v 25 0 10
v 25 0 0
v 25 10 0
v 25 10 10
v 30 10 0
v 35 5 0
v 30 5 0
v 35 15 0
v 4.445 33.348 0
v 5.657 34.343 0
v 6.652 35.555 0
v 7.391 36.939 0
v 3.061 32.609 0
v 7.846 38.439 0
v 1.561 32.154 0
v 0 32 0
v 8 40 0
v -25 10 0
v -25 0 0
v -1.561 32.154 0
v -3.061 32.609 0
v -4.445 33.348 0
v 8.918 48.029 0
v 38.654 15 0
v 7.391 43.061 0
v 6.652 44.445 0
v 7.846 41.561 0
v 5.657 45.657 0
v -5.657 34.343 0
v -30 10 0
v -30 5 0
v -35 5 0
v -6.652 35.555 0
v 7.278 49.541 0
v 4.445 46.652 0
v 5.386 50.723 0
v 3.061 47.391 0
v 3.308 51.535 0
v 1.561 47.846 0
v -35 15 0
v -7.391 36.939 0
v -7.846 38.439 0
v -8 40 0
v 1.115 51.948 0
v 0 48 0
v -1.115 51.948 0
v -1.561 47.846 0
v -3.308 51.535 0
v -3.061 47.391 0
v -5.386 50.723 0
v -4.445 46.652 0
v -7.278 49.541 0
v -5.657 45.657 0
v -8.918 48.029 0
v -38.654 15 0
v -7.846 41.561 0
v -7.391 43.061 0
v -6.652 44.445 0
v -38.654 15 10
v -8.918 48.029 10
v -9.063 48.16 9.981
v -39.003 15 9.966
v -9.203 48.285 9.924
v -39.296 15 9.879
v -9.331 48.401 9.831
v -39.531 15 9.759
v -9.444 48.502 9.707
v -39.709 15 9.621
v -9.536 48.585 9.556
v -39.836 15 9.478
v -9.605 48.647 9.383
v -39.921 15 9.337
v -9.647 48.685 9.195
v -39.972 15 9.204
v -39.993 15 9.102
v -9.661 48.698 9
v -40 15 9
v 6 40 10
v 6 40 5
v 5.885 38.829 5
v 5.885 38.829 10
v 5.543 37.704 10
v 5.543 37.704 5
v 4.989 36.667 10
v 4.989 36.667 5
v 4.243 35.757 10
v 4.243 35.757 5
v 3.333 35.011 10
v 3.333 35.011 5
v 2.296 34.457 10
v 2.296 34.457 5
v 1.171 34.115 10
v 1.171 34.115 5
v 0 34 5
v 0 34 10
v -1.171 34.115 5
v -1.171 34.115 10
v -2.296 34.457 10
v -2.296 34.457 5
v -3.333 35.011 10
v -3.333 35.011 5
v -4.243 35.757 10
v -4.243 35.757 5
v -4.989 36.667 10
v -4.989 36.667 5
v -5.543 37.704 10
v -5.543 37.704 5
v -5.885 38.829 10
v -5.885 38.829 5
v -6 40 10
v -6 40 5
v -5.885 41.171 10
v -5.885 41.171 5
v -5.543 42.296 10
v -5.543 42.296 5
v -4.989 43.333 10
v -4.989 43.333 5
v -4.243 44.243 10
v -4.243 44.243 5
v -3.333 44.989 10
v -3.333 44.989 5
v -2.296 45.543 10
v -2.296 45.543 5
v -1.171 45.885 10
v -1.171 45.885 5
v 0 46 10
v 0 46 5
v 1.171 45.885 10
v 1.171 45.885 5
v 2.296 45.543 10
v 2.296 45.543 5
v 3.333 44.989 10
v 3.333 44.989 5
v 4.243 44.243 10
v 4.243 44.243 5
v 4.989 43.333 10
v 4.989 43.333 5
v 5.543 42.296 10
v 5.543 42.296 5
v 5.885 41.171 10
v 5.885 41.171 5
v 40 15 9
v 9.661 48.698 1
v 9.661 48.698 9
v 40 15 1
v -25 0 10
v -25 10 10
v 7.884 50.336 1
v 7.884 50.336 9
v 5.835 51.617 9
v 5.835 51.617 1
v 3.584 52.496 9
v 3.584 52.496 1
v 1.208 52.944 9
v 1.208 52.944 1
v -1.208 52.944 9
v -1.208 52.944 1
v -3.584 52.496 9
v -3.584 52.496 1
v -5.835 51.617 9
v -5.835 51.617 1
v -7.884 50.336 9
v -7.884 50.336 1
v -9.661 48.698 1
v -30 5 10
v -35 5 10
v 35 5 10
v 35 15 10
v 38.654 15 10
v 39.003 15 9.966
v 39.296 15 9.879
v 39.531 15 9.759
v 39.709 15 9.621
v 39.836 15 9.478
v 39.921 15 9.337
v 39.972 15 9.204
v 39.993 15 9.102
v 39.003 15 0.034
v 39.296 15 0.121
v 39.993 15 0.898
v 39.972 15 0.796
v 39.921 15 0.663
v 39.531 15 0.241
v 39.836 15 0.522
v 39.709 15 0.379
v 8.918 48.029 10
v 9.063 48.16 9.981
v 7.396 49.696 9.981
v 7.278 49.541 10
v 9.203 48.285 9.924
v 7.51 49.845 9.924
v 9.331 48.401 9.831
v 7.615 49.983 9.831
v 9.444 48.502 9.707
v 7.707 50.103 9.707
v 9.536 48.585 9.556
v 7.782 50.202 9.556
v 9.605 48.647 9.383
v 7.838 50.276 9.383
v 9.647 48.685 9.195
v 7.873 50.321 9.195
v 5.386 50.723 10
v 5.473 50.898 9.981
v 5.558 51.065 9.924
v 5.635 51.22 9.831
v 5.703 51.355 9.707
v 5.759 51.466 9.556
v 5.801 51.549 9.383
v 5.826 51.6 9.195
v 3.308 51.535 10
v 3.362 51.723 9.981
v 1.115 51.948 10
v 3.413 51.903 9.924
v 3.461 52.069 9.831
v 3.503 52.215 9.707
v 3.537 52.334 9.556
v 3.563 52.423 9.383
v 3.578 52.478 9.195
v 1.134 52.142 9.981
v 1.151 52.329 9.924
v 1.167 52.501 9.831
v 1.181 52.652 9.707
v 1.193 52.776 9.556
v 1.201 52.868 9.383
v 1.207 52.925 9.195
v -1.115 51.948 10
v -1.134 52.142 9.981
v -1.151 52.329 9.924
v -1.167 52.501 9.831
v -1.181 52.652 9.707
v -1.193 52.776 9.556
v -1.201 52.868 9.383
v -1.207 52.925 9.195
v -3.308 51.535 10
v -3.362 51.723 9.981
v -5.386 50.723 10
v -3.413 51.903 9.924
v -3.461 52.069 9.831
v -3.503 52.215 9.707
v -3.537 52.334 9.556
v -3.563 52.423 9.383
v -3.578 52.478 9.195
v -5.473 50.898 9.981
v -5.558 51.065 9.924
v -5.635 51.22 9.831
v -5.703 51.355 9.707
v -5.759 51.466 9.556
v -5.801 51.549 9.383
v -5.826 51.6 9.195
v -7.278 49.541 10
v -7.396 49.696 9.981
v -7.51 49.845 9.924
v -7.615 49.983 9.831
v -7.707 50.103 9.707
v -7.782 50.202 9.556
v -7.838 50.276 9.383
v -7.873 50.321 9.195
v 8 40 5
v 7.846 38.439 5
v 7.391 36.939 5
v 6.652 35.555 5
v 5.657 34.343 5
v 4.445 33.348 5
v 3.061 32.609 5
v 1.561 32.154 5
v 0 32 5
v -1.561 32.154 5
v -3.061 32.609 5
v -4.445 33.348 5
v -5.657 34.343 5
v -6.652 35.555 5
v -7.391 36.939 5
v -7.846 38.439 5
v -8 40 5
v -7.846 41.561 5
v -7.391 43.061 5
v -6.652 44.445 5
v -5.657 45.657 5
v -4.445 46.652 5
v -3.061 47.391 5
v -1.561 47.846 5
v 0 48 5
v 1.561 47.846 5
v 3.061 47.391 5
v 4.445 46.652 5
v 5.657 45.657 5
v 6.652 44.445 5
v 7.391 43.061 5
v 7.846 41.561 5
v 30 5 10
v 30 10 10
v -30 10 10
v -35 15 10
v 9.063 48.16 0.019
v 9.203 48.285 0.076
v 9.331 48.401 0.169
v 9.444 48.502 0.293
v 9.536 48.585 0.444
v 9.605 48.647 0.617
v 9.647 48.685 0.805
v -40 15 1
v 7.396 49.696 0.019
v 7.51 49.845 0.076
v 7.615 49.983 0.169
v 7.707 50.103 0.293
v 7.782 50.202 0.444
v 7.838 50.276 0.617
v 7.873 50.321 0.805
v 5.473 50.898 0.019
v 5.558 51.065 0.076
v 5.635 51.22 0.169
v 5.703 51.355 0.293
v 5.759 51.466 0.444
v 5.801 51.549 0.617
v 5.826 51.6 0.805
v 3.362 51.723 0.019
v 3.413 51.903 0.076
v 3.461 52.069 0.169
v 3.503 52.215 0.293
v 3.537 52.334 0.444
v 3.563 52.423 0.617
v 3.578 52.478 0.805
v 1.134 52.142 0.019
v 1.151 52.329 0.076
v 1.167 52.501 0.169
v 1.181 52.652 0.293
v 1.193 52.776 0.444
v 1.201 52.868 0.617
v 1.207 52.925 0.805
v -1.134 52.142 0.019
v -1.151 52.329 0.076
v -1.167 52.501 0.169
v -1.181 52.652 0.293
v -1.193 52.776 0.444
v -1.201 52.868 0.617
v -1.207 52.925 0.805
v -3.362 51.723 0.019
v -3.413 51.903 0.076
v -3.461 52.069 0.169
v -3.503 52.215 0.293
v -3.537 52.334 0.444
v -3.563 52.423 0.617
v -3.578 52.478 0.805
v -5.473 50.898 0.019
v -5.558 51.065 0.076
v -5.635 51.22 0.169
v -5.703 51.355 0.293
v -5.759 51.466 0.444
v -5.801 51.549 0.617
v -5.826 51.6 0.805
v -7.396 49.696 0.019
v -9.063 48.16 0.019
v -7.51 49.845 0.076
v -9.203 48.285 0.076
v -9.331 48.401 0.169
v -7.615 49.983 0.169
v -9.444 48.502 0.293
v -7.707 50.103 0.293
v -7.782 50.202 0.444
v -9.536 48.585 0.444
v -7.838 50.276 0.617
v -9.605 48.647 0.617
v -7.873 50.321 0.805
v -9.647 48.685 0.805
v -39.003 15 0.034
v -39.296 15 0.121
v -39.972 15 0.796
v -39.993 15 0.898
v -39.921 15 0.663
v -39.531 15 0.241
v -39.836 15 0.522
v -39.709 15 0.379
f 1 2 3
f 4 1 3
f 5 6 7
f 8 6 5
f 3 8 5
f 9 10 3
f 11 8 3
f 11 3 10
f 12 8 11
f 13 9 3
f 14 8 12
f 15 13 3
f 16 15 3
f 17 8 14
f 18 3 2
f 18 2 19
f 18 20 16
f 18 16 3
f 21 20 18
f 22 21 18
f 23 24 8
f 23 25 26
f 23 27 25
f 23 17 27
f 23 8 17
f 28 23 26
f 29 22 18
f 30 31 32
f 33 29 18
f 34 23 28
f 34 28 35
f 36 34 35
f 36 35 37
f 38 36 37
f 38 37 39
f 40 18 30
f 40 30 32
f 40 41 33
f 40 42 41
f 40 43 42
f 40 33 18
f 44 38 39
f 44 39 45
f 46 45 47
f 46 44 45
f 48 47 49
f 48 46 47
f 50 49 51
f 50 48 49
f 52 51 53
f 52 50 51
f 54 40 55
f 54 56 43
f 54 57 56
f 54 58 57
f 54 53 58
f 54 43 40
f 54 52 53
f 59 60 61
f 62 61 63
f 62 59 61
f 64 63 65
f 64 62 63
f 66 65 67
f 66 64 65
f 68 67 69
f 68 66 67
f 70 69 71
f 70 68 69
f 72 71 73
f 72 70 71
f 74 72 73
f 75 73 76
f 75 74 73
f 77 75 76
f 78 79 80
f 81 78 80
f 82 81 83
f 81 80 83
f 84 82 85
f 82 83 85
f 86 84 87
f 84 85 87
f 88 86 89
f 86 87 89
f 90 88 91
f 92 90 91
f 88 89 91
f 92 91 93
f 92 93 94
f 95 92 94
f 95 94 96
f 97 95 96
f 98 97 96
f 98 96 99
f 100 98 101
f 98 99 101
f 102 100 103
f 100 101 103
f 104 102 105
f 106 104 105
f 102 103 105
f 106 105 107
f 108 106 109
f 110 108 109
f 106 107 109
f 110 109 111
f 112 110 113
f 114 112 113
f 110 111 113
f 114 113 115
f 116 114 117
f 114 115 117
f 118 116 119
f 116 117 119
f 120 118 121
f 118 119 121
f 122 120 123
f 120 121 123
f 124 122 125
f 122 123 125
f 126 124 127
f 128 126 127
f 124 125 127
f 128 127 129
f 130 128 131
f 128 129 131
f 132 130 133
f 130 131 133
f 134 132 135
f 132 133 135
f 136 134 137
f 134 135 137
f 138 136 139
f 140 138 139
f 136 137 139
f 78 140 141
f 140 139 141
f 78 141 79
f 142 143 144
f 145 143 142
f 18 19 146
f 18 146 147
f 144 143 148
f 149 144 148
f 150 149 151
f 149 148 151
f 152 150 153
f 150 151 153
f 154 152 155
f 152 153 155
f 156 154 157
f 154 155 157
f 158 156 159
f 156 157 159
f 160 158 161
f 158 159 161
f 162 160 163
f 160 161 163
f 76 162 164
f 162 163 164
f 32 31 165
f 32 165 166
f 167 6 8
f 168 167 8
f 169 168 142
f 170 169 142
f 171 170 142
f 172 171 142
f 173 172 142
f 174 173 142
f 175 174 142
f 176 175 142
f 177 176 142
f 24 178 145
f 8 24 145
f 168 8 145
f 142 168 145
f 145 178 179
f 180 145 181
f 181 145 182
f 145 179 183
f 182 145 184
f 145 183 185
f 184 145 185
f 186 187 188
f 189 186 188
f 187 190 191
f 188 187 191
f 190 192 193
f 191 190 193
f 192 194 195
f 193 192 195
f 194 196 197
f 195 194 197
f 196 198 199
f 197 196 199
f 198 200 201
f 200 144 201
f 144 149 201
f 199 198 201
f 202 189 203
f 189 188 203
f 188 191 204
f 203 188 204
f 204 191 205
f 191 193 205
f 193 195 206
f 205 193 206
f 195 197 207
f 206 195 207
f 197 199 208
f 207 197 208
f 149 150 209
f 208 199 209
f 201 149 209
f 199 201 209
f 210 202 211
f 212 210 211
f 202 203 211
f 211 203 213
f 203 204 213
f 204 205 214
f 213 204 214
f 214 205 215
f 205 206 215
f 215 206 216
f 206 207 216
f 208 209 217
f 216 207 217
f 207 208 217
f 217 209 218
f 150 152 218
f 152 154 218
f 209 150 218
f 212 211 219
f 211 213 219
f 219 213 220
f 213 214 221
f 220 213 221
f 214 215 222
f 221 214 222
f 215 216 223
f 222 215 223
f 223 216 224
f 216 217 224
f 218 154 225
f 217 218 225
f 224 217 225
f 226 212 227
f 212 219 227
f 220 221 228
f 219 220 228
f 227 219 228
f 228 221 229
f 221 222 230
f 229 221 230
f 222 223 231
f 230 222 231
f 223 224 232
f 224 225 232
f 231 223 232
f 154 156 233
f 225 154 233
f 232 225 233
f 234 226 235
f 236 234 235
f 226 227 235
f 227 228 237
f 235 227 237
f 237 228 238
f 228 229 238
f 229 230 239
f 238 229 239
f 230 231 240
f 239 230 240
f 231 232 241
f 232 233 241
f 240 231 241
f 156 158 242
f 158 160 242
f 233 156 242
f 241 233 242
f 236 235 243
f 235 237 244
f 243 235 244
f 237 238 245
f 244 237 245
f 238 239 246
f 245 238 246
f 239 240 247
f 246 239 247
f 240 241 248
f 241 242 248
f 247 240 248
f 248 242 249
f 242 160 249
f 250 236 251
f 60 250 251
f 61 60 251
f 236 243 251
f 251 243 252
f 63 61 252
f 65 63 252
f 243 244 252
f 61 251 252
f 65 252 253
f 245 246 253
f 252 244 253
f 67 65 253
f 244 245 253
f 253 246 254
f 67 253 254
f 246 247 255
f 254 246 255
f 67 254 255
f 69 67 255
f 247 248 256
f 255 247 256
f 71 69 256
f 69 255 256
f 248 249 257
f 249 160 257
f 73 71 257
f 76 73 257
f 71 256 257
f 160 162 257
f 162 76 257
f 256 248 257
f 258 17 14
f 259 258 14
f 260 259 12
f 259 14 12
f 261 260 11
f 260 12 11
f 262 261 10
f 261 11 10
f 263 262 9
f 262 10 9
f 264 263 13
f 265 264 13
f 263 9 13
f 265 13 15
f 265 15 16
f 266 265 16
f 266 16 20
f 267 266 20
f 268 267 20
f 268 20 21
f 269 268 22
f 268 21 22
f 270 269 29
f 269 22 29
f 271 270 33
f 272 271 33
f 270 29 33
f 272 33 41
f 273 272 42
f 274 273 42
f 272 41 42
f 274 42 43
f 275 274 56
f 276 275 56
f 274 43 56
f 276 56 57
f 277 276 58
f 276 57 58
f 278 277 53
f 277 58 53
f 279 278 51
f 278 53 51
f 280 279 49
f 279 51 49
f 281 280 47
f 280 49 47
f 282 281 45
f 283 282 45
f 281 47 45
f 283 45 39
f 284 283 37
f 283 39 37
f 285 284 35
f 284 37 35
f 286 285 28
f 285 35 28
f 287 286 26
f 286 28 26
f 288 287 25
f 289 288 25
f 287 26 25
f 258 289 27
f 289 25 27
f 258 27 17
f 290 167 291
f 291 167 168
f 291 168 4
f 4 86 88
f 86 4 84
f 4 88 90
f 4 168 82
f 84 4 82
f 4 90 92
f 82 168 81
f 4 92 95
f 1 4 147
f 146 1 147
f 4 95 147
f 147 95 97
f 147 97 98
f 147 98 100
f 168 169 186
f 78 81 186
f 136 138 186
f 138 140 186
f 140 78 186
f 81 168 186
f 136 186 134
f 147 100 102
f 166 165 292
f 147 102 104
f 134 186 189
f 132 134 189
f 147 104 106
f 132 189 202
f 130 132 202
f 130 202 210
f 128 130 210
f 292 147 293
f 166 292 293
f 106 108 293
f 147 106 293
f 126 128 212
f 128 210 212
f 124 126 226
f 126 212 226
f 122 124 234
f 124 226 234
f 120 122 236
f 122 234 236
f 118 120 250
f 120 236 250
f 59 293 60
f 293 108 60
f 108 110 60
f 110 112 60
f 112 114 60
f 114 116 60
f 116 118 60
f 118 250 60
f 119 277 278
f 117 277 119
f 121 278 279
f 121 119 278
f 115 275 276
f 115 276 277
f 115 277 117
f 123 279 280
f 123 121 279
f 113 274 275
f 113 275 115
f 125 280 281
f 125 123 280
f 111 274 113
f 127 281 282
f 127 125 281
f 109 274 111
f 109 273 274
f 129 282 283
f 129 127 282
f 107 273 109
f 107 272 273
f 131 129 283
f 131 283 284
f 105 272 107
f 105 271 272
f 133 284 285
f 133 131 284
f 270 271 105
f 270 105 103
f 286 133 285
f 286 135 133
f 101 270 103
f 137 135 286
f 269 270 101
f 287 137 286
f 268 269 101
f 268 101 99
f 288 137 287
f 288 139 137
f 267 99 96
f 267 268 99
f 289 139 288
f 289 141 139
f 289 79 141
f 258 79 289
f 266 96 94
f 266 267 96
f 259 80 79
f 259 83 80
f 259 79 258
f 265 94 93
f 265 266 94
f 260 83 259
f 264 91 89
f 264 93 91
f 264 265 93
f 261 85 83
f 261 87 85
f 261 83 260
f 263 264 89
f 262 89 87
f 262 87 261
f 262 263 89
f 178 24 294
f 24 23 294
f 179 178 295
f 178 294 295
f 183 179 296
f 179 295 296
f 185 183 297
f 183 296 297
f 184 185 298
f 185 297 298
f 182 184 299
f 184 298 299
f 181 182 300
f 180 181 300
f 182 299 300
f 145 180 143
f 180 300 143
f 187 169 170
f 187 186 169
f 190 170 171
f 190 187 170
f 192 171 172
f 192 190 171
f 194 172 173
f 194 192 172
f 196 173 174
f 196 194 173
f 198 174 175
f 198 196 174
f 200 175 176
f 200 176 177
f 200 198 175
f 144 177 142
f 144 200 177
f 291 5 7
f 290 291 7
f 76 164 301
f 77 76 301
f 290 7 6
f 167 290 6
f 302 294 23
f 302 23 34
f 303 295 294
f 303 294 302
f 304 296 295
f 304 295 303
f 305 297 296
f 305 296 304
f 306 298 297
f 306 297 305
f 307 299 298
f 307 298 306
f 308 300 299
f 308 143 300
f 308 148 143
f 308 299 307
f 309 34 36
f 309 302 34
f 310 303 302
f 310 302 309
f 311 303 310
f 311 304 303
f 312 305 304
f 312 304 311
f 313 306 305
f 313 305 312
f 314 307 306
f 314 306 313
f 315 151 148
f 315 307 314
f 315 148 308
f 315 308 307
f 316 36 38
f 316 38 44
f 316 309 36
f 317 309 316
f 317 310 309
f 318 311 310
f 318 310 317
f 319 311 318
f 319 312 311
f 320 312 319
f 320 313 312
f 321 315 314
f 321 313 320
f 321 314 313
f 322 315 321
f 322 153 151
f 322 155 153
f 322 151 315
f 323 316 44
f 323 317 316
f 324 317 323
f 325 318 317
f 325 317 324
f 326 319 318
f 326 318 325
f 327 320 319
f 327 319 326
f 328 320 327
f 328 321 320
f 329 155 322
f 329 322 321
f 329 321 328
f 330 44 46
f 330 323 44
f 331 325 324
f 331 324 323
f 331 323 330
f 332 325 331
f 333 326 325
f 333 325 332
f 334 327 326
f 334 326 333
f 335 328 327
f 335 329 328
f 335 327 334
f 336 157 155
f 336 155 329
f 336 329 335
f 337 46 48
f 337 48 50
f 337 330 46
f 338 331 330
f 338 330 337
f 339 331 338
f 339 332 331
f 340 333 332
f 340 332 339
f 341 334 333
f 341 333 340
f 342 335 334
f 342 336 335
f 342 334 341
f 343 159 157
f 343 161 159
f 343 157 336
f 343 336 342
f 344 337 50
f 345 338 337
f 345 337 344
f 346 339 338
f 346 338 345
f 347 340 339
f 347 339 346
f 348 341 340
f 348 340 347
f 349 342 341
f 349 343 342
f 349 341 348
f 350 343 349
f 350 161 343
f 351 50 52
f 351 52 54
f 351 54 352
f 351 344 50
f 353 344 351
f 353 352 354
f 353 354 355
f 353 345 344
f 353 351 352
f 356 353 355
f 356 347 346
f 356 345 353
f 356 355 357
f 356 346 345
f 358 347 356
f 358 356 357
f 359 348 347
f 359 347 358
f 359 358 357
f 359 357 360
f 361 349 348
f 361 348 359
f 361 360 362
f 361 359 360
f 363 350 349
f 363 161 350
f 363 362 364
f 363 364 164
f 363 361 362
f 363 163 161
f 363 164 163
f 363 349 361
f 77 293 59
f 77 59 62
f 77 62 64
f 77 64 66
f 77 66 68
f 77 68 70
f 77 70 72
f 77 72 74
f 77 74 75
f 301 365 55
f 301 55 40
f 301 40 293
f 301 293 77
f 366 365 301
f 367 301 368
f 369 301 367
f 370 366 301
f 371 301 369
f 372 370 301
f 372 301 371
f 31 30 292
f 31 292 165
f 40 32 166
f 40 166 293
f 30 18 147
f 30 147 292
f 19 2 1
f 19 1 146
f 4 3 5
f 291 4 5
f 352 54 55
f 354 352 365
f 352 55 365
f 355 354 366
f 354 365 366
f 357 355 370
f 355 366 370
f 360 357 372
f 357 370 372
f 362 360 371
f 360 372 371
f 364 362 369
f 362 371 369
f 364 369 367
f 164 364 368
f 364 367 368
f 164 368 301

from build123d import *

# Parameters (mm, degrees)
PAD_DEPTH       = 10
SKETCH001_R     = 8
POCKET_DEPTH    = 5
SKETCH003_R     = 6
POCKET001_DEPTH = 5
POCKET002_DEPTH = 10
FILLET_R        = 1


with BuildPart() as part:
    # Sketch → Pad (new body)
    with BuildSketch(Plane.XY):
        with BuildLine():
            Line((40, 0), (-40, 0))
            Line((-40, 0), (-40, 15))
            Line((-9.661357, 48.698171), (-40, 15))
            ThreePointArc((9.661357, 48.698171), (0, 53), (-9.661357, 48.698171))
            Line((9.661357, 48.698171), (40, 15))
            Line((40, 0), (40, 15))
        make_face()
    extrude(amount=PAD_DEPTH)

    # Sketch001 → Pocket (cut)
    with BuildSketch(Plane(origin=(0, 0, 0), x_dir=(1, 0, 0), z_dir=(0, 0, -1))):
        with Locations((0, -40)):
            Circle(SKETCH001_R)
    extrude(amount=-POCKET_DEPTH, mode=Mode.SUBTRACT)

    # Sketch003 → Pocket001 (cut)
    with BuildSketch(Plane(origin=(0, 0, 5), x_dir=(1, 0, 0), z_dir=(0, 0, -1))):
        with Locations((0, -40)):
            Circle(SKETCH003_R)
    extrude(amount=-POCKET001_DEPTH, mode=Mode.SUBTRACT)

    # Sketch002 → Pocket002 (cut)
    with BuildSketch(Plane(origin=(0, 0, 0), x_dir=(1, 0, 0), z_dir=(0, 0, -1))):
        Polygon((-40, -15), (-40, 0), (-25, 0), (-25, -10), (-30, -10), (-30, -5), (-35, -5), (-35, -15), align=None)
        Polygon((40, -15), (40, 0), (25, 0), (25, -10), (30, -10), (30, -5), (35, -5), (35, -15), align=None)
    extrude(amount=-POCKET002_DEPTH, mode=Mode.SUBTRACT)

    # Fillet
    fillet_edges = [part.edges().sort_by_distance(p)[0] for p in [
        (-24.830678, 31.849086, 10),
        (-24.830678, 31.849086, 0),
    ]]
    fillet(fillet_edges, radius=FILLET_R)


solid = part.part
